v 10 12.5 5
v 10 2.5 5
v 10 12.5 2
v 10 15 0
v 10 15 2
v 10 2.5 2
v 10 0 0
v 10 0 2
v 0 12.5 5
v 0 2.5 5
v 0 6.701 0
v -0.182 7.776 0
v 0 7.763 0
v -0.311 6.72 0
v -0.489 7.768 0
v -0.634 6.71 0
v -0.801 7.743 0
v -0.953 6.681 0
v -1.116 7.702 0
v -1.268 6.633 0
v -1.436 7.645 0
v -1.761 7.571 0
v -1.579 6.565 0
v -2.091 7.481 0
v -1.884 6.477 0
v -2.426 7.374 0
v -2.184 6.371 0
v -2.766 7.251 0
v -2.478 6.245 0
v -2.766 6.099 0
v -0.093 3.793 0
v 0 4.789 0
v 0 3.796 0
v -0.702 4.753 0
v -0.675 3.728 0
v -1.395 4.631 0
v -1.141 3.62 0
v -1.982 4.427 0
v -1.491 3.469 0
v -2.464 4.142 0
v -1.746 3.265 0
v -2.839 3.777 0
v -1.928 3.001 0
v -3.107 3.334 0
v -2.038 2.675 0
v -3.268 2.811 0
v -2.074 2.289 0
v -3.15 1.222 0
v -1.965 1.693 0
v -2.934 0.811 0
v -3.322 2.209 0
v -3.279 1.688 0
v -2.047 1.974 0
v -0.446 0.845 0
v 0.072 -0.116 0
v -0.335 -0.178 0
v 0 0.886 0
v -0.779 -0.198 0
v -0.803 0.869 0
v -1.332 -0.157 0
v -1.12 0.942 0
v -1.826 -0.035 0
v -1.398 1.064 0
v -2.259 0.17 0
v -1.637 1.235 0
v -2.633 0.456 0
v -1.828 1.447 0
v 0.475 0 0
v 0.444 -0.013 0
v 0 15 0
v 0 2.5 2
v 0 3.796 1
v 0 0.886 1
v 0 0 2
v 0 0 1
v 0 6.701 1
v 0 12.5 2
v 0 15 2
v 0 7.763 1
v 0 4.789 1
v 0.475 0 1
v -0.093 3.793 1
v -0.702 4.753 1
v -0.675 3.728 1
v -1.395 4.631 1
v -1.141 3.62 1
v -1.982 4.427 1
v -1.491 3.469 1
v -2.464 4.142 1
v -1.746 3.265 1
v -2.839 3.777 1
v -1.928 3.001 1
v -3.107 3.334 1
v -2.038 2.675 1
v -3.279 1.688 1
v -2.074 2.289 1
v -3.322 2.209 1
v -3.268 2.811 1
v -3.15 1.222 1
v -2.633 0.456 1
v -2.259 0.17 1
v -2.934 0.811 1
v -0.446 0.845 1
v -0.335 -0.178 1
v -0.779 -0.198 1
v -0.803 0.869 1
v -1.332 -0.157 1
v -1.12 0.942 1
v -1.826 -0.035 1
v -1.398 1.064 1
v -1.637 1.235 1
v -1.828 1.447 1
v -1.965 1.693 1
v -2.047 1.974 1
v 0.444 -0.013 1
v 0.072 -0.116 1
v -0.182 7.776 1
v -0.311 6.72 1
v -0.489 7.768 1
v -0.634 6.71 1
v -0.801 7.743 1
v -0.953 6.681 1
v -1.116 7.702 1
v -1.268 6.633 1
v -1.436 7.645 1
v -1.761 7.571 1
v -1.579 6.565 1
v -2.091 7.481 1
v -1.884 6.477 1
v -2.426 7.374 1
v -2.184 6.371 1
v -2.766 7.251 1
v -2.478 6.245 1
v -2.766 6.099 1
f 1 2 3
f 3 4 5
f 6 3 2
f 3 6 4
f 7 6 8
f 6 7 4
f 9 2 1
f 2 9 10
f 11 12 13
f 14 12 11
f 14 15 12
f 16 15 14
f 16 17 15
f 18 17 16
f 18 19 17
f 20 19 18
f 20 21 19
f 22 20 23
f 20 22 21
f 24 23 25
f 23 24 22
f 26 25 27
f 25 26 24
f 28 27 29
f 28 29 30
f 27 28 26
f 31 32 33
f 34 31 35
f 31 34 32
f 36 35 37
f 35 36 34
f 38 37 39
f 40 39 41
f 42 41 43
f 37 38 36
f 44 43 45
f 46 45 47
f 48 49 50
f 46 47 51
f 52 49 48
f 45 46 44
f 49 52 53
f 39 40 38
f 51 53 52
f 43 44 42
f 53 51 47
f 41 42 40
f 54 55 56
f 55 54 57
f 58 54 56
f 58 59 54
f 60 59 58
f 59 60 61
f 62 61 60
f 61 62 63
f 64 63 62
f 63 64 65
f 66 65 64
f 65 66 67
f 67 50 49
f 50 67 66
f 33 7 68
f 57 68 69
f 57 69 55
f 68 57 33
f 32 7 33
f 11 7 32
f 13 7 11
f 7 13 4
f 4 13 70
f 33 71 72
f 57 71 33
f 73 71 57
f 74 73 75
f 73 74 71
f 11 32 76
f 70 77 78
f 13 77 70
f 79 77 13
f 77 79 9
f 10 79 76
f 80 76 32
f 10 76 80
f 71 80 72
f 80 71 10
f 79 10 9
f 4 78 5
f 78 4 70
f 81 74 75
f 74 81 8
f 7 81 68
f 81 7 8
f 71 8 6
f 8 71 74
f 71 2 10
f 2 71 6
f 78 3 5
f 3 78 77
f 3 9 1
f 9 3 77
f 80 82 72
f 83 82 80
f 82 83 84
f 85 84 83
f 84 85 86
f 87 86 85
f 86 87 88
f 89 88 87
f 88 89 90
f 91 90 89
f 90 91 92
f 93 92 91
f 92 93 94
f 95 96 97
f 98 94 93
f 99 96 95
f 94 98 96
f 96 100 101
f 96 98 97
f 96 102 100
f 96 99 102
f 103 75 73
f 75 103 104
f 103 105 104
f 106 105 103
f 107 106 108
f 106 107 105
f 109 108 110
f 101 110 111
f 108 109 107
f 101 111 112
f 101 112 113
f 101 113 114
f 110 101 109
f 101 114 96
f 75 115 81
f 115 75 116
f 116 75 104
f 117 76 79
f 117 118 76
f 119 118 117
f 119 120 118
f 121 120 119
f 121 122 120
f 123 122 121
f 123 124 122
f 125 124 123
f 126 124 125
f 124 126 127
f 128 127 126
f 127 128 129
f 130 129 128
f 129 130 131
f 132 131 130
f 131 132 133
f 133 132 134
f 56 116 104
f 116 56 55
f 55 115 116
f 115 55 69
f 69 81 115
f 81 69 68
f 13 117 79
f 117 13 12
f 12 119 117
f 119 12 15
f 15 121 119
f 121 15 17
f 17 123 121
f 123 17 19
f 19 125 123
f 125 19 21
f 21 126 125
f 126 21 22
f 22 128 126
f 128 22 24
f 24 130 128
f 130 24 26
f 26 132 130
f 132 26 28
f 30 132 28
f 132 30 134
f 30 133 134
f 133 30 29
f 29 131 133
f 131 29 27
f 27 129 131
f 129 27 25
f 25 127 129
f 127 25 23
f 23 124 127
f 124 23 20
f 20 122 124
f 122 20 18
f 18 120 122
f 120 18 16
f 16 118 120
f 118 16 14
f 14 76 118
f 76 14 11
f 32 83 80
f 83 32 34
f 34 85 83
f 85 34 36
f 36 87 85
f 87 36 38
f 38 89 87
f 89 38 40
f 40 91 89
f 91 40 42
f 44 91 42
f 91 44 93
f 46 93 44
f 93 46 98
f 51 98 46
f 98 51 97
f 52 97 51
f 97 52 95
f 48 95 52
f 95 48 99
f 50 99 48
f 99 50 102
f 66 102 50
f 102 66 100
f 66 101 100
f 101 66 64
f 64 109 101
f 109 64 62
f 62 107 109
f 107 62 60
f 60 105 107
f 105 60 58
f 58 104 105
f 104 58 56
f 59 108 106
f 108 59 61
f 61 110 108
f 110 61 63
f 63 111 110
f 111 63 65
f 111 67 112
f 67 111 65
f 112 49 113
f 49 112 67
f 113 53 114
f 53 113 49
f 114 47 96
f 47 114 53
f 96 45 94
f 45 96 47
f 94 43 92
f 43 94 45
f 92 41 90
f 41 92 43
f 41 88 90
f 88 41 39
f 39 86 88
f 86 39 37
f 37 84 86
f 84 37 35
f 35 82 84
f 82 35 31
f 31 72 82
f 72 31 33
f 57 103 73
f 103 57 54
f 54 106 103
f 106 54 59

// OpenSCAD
piece_x = 10;
piece_y = 15;
piece_z = 5;

legs_z = 3;

letter_y =10;

letter_size = 10;
letter_height = 1;
letter_font = "Calibri";

letter = "a";

letter_rotated = false;





difference()
{
    cube([piece_x,piece_y,piece_z]);
    translate([0,0,piece_z - legs_z]) cube([piece_x,(piece_y - letter_y)*0.5,legs_z]);
    translate([0,piece_y - (piece_y - letter_y)*0.5,piece_z - legs_z]) cube([piece_x,(piece_y - letter_y)*0.5,legs_z]);
}


if(letter_rotated)
{
    translate([0,0,letter_height])
    rotate([0,180,0])
    {
        linear_extrude(letter_height)
        {
            text(letter, font = letter_font, size = letter_size, halign = "center", valign = "baseline");
        }
    }
}
else
{
    linear_extrude(letter_height)
    {
        text(letter, font = letter_font, size = letter_size, halign = "center", valign = "baseline");
    }
}
